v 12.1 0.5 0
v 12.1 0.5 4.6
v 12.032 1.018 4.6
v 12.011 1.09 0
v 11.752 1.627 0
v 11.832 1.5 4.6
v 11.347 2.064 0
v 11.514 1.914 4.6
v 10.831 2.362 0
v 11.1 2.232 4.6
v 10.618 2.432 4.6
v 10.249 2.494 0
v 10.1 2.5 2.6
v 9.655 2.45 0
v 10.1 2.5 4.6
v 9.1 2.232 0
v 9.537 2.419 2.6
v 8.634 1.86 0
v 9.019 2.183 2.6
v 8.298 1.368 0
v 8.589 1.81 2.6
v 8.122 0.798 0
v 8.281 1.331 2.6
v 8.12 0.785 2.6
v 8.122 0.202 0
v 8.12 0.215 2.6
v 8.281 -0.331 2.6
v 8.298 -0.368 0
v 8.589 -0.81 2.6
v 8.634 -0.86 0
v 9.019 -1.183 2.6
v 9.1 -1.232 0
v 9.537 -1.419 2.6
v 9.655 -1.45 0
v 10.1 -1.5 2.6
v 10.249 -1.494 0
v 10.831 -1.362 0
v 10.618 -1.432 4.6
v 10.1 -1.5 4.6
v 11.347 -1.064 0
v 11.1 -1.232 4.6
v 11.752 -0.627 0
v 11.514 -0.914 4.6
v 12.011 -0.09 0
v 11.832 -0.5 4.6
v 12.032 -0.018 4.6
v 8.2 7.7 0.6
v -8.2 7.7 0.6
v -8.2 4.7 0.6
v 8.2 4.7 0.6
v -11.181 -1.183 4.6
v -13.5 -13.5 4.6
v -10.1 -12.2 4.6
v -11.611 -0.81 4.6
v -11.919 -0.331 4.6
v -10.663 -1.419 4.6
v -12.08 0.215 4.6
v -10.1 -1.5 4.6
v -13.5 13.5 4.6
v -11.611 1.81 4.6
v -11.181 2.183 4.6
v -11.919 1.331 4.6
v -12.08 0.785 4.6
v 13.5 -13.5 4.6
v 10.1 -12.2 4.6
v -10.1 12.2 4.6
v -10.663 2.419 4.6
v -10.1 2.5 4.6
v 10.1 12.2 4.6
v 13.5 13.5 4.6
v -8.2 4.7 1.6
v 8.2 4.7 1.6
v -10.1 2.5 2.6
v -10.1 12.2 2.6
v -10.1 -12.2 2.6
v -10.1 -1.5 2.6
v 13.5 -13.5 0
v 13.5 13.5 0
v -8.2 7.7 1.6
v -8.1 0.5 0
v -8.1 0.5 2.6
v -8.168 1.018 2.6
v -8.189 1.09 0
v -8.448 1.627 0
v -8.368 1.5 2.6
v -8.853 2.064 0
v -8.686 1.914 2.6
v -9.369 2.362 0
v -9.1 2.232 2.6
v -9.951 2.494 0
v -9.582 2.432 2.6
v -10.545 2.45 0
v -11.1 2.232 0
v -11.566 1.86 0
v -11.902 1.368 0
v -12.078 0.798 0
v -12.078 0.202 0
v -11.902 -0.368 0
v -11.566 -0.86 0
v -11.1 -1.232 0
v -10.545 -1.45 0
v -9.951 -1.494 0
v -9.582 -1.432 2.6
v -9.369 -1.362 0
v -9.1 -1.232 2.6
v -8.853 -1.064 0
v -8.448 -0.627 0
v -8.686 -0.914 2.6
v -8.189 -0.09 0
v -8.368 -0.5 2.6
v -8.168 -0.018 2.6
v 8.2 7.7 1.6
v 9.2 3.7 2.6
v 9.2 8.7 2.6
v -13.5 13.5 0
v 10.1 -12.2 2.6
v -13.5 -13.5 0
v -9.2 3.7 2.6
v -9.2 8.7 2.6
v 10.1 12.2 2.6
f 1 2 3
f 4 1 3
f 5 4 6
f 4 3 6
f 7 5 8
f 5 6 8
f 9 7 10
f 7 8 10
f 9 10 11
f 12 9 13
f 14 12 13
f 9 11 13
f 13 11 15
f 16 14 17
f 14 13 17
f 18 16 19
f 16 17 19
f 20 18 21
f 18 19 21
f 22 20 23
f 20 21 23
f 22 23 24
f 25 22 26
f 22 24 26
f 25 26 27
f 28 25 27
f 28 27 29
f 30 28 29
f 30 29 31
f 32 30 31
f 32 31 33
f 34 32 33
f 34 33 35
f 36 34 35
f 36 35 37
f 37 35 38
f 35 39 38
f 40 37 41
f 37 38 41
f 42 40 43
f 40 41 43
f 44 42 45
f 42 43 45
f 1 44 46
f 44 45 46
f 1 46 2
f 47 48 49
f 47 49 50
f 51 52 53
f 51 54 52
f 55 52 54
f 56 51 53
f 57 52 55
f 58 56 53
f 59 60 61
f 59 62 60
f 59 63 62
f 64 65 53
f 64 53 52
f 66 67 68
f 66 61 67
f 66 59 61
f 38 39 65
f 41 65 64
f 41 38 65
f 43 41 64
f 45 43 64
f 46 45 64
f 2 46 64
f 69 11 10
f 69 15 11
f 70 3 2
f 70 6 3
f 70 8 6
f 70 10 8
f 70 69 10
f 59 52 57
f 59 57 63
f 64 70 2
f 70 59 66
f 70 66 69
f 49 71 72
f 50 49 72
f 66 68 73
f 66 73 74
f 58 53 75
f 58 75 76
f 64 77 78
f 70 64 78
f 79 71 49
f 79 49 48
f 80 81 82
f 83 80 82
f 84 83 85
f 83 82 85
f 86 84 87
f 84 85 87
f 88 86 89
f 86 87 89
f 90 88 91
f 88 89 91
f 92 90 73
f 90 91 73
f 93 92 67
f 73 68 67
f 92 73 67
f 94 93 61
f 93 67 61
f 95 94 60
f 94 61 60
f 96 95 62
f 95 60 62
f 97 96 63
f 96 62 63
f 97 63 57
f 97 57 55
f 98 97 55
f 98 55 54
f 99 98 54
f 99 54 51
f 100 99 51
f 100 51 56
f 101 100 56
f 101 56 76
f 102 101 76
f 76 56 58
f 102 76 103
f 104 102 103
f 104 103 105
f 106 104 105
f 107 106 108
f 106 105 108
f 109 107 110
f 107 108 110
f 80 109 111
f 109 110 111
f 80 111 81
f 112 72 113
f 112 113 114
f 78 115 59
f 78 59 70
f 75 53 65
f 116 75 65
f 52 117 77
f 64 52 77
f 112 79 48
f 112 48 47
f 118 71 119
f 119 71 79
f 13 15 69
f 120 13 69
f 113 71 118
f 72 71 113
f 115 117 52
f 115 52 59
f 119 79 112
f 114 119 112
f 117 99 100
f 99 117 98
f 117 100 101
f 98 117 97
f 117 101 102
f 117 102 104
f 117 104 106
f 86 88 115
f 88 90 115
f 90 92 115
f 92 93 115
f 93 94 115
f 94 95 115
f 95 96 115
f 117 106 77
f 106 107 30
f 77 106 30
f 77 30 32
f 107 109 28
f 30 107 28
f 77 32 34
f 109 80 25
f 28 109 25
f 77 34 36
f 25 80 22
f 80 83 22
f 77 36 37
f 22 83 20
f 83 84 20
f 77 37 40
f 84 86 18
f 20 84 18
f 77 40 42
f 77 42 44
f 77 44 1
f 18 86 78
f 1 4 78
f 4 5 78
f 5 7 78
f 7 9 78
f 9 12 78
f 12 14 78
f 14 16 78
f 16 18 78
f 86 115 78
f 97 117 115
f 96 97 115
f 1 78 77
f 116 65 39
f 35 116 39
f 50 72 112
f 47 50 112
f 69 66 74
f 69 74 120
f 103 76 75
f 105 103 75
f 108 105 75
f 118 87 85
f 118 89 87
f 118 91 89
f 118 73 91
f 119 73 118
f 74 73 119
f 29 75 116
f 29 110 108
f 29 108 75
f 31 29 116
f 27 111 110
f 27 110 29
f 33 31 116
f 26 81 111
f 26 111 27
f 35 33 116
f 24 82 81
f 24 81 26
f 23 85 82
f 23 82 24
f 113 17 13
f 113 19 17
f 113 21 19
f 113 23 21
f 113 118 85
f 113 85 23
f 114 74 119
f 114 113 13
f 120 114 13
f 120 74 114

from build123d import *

# Parameters (mm, degrees)
SKETCH_W        = 27
SKETCH_H        = 27
PAD_DEPTH       = 4.6
SKETCH001_W     = 20.2
SKETCH001_H     = 24.4
POCKET_DEPTH    = 2
SKETCH002_W     = 16.4
SKETCH002_H     = 3
POCKET001_DEPTH = 2
CHAMFER_SIZE    = 1
SKETCH003_R     = 2
POCKET002_DEPTH = 4.601


with BuildPart() as part:
    # Sketch → Pad (new body)
    with BuildSketch(Plane.XY):
        Rectangle(SKETCH_W, SKETCH_H)
    extrude(amount=PAD_DEPTH)

    # Sketch001 (on Face6 of Pad) → Pocket (cut)
    with BuildSketch(Plane.XY.offset(4.6)):
        Rectangle(SKETCH001_W, SKETCH001_H)
    extrude(amount=-POCKET_DEPTH, mode=Mode.SUBTRACT)

    # Sketch002 (on Face11 of Pocket) → Pocket001 (cut)
    with BuildSketch(Plane.XY.offset(2.6)):
        with Locations((0, 6.2)):
            Rectangle(SKETCH002_W, SKETCH002_H)
    extrude(amount=-POCKET001_DEPTH, mode=Mode.SUBTRACT)

    # Chamfer
    chamfer_edges = [part.edges().sort_by_distance(p)[0] for p in [
        (0, 7.7, 2.6),
        (-8.2, 6.2, 2.6),
        (0, 4.7, 2.6),
        (8.2, 6.2, 2.6),
    ]]
    chamfer(chamfer_edges, length=CHAMFER_SIZE)

    # Sketch003 (on Face14 of Chamfer) → Pocket002 (cut, through all)
    with BuildSketch(Plane.XY.offset(4.6)):
        with Locations((-10.1, 0.5)):
            Circle(SKETCH003_R)
        with Locations((10.1, 0.5)):
            Circle(SKETCH003_R)
    extrude(amount=-POCKET002_DEPTH, mode=Mode.SUBTRACT)


solid = part.part
